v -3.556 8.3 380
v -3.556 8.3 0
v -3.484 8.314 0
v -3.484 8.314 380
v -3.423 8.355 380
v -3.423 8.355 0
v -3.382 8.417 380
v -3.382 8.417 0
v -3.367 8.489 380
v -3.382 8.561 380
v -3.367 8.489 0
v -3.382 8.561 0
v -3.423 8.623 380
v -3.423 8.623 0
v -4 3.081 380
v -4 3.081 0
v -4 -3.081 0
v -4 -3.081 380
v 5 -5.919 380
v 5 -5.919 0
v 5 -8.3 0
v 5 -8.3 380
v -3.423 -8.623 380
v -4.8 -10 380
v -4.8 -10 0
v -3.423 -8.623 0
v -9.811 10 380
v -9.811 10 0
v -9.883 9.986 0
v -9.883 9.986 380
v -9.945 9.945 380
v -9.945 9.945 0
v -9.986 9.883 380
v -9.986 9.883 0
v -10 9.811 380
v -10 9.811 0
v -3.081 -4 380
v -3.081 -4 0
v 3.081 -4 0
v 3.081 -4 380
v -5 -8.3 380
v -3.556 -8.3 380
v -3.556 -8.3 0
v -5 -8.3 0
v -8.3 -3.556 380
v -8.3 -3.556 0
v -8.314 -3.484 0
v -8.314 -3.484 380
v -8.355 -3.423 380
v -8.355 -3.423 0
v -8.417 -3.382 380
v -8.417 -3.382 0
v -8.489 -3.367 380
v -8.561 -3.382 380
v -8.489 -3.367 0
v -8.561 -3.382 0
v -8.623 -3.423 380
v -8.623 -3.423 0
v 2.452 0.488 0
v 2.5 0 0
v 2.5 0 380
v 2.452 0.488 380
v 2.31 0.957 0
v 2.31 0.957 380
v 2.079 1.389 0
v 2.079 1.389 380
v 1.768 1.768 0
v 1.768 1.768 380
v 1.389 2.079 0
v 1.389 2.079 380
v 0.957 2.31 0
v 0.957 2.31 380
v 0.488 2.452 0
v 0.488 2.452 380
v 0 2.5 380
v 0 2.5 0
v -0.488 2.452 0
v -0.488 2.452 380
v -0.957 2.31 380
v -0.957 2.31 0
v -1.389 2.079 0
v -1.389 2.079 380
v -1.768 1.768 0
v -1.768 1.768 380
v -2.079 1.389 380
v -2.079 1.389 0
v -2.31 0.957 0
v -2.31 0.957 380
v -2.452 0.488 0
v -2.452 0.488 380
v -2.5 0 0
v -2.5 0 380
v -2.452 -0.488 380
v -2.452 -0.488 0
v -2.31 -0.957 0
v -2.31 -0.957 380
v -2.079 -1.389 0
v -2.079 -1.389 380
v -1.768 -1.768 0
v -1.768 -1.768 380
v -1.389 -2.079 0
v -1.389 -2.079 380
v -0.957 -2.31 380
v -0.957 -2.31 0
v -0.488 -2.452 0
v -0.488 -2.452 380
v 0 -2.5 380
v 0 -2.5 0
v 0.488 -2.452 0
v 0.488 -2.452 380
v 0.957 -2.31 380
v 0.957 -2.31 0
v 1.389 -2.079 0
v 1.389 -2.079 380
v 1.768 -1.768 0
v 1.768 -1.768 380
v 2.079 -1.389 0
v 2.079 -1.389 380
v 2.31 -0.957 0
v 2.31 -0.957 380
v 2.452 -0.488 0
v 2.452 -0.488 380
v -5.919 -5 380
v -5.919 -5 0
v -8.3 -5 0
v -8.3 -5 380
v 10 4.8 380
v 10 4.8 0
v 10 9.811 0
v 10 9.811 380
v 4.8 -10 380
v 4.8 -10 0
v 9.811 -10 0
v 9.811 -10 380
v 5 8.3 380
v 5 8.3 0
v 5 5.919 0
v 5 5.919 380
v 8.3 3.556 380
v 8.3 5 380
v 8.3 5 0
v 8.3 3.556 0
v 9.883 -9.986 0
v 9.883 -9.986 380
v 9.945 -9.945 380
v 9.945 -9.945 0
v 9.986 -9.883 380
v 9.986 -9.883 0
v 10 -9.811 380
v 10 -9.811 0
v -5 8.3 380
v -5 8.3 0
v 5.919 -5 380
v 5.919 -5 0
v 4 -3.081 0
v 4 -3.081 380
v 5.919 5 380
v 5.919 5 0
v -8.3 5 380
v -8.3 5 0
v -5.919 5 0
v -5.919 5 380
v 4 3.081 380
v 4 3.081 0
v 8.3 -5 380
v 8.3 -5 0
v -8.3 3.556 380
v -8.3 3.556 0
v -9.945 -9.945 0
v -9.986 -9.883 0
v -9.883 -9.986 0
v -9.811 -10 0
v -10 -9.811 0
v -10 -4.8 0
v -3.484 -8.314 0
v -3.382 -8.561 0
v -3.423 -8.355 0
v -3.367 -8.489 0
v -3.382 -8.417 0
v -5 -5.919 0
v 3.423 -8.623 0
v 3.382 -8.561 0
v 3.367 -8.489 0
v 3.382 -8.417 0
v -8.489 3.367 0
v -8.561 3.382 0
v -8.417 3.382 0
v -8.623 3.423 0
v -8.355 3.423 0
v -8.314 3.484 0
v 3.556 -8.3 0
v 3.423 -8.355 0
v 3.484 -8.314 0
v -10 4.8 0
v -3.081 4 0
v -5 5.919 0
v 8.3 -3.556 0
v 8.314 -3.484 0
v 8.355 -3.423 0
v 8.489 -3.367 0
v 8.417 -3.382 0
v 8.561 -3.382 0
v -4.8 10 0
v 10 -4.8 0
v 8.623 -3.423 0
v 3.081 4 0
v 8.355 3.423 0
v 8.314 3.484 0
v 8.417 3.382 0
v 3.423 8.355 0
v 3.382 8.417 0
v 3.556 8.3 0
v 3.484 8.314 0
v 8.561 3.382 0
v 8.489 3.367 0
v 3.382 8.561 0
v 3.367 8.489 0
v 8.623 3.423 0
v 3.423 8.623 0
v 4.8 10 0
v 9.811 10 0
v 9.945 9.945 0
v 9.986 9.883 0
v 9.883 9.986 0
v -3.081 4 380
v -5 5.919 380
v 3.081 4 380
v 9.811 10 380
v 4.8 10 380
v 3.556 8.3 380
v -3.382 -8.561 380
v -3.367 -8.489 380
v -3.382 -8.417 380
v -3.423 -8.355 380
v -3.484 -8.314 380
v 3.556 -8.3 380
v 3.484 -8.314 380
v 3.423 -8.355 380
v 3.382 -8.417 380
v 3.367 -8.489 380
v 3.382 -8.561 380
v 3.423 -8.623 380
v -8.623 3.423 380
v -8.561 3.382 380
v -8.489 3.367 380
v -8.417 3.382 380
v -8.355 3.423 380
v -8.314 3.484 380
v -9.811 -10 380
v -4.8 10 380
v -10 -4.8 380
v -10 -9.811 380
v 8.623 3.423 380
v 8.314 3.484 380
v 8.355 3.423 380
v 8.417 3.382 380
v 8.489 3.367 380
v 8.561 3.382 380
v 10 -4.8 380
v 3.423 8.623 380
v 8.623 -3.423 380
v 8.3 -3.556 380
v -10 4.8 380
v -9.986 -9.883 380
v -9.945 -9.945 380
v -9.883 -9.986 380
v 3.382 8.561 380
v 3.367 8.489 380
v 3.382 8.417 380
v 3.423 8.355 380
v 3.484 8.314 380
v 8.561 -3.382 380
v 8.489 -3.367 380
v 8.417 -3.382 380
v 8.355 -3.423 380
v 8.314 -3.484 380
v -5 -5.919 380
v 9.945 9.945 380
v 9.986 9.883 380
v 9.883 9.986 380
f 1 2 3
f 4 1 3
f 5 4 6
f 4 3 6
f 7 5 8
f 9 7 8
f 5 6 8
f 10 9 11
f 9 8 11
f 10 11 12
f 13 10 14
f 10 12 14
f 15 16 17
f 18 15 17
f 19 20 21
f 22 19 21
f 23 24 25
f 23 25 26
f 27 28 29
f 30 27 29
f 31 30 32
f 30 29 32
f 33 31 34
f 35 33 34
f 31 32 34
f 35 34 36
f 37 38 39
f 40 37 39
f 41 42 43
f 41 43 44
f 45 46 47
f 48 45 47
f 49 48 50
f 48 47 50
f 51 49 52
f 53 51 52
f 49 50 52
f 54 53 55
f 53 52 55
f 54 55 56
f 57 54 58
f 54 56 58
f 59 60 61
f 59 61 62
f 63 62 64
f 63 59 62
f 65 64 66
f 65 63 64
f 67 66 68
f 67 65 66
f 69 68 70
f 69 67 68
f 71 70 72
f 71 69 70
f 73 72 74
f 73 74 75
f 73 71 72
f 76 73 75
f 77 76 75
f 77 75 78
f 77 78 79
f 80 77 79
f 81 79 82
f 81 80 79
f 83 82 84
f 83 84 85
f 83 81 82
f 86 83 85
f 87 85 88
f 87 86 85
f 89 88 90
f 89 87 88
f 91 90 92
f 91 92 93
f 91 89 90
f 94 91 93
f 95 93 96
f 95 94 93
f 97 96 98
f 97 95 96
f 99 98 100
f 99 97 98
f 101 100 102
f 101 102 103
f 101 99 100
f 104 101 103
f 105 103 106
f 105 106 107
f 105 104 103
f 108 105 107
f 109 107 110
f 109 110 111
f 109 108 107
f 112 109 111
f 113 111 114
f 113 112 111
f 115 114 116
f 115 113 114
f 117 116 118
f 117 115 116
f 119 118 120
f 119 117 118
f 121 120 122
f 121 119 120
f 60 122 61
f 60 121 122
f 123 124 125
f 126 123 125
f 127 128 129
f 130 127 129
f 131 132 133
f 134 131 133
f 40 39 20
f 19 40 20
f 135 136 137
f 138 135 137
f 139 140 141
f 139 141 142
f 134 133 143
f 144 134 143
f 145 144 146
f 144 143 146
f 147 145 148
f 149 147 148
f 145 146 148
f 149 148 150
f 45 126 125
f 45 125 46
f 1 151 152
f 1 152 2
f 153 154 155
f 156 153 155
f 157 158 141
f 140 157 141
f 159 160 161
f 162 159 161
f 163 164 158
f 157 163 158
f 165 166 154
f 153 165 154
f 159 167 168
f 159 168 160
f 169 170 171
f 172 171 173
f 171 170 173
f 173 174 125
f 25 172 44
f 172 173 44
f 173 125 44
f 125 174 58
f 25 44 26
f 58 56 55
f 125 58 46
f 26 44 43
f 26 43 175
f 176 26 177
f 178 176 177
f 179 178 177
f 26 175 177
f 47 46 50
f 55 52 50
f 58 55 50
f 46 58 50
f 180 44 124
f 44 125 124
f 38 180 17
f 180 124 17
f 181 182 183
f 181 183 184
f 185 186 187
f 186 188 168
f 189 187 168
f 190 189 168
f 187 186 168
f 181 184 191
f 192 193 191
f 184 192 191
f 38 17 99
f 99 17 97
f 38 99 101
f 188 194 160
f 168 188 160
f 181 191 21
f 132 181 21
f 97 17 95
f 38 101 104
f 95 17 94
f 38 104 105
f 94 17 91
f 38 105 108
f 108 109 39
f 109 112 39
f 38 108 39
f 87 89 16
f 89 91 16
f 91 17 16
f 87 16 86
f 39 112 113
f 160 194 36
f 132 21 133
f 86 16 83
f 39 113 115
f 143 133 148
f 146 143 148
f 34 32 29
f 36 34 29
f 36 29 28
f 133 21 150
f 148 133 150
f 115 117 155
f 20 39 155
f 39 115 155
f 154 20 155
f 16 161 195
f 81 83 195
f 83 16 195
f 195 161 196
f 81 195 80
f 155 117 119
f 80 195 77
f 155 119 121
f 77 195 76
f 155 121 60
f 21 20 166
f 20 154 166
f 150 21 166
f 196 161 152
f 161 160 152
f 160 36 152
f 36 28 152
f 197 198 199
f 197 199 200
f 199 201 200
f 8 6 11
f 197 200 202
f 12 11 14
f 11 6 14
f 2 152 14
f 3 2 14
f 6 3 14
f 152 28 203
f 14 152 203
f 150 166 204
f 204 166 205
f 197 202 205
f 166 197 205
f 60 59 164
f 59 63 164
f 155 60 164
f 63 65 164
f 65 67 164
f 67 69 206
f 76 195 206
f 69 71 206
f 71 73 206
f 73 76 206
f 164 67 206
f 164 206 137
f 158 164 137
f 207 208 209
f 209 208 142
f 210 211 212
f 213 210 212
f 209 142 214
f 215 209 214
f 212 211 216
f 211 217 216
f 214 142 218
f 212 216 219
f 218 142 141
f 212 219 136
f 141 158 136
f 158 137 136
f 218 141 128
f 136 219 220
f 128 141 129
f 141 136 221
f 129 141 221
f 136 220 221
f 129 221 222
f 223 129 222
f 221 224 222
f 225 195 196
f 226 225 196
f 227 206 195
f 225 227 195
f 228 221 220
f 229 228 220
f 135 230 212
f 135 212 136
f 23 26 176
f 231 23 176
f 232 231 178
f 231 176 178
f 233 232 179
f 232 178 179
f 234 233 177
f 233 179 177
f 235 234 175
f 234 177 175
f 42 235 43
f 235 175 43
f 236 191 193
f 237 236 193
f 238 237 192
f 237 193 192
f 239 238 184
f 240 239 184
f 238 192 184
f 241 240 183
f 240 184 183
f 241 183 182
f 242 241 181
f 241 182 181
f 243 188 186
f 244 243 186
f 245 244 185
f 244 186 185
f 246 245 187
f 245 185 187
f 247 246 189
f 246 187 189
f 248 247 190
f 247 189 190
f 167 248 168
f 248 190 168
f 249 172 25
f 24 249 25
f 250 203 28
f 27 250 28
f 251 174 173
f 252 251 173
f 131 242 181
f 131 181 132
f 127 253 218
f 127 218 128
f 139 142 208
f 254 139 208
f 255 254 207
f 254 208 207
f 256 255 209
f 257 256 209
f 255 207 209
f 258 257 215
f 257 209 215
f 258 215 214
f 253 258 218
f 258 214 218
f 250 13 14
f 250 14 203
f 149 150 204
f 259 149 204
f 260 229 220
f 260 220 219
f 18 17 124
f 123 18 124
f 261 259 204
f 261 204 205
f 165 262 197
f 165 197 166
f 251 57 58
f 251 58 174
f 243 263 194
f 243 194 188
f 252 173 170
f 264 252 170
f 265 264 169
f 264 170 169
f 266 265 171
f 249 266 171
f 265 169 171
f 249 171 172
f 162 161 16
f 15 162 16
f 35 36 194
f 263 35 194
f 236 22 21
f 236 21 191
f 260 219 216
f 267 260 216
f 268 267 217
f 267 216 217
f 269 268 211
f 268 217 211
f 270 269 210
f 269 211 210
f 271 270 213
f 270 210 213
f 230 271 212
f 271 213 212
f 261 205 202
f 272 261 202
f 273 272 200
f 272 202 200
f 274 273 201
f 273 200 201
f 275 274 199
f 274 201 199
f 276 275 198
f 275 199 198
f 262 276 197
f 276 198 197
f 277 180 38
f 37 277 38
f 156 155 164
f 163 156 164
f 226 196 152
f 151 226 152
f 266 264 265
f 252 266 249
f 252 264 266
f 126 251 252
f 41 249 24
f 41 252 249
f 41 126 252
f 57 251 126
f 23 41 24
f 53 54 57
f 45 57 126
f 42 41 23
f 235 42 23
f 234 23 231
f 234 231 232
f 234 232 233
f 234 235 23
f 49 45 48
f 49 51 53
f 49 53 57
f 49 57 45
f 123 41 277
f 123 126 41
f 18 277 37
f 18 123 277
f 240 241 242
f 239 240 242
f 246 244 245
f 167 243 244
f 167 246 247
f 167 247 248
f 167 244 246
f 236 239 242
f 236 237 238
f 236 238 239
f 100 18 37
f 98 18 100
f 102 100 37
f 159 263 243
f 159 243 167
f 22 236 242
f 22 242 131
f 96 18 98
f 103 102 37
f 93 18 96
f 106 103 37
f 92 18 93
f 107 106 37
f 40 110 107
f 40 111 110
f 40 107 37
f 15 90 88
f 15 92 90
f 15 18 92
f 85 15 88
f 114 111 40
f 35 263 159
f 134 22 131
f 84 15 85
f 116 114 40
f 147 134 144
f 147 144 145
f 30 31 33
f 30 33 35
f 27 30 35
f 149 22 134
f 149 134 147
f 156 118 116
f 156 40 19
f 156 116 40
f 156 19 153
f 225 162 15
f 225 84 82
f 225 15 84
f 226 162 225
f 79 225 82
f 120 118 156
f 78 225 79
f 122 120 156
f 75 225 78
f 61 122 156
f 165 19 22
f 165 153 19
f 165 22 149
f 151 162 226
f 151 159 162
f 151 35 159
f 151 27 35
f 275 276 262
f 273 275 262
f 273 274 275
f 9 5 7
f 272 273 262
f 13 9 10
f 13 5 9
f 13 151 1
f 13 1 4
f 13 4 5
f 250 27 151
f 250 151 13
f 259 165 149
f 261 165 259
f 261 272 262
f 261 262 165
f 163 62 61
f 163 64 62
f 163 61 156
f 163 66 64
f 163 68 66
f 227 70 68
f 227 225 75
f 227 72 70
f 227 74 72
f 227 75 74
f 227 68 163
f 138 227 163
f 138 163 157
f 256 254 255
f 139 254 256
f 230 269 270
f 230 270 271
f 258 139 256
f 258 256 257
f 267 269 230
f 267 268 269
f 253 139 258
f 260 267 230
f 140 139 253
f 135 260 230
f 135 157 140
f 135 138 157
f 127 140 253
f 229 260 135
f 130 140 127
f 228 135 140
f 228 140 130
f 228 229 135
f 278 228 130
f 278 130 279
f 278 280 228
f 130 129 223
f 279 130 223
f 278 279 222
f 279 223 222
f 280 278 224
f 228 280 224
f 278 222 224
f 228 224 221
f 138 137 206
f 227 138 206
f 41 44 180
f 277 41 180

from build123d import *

# Parameters (mm, degrees)
SKETCH1_R           = 2.5
BOSS_EXTRUDE4_DEPTH = 380


with BuildPart() as part:
    # Sketch1 → Boss-Extrude4 (new body)
    with BuildSketch(Plane.XY):
        with BuildLine():
            Line((-10, 9.810918806), (-10, 4.8))
            Line((-10, 4.8), (-8.622781789, 3.422781789))
            ThreePointArc((-8.622781789, 3.422781789), (-8.416722954, 3.381794139), (-8.3, 3.556482384))
            Line((-8.3, 3.556482384), (-8.3, 5))
            Line((-8.3, 5), (-5.919238816, 5))
            Line((-5.919238816, 5), (-4, 3.080761184))
            Line((-4, 3.080761184), (-4, -3.080761184))
            Line((-4, -3.080761184), (-5.919238816, -5))
            Line((-5.919238816, -5), (-8.3, -5))
            Line((-8.3, -5), (-8.3, -3.556482384))
            ThreePointArc((-8.3, -3.556482384), (-8.416722954, -3.381794139), (-8.622781789, -3.422781789))
            Line((-8.622781789, -3.422781789), (-10, -4.8))
            Line((-10, -4.8), (-10, -9.810918806))
            ThreePointArc((-10, -9.810918806), (-9.9446194, -9.9446194), (-9.810918806, -10))
            Line((-9.810918806, -10), (-4.8, -10))
            Line((-4.8, -10), (-3.422781789, -8.622781789))
            ThreePointArc((-3.422781789, -8.622781789), (-3.381794139, -8.416722954), (-3.556482384, -8.3))
            Line((-3.556482384, -8.3), (-5, -8.3))
            Line((-5, -8.3), (-5, -5.919238816))
            Line((-5, -5.919238816), (-3.080761184, -4))
            Line((-3.080761184, -4), (0, -4))
            Line((0, -4), (3.080761184, -4))
            Line((3.080761184, -4), (5, -5.919238816))
            Line((5, -5.919238816), (5, -8.3))
            Line((5, -8.3), (3.556482384, -8.3))
            ThreePointArc((3.556482384, -8.3), (3.381794139, -8.416722954), (3.422781789, -8.622781789))
            Line((3.422781789, -8.622781789), (4.8, -10))
            Line((4.8, -10), (9.810918806, -10))
            ThreePointArc((9.810918806, -10), (9.9446194, -9.9446194), (10, -9.810918806))
            Line((10, -9.810918806), (10, -4.8))
            Line((10, -4.8), (8.622781789, -3.422781789))
            ThreePointArc((8.622781789, -3.422781789), (8.416722954, -3.381794139), (8.3, -3.556482384))
            Line((8.3, -3.556482384), (8.3, -5))
            Line((8.3, -5), (5.919238816, -5))
            Line((5.919238816, -5), (4, -3.080761184))
            Line((4, -3.080761184), (4, 3.080761184))
            Line((4, 3.080761184), (5.919238816, 5))
            Line((5.919238816, 5), (8.3, 5))
            Line((8.3, 5), (8.3, 3.556482384))
            ThreePointArc((8.3, 3.556482384), (8.416722954, 3.381794139), (8.622781789, 3.422781789))
            Line((8.622781789, 3.422781789), (10, 4.8))
            Line((10, 4.8), (10, 9.810918806))
            ThreePointArc((10, 9.810918806), (9.9446194, 9.9446194), (9.810918806, 10))
            Line((9.810918806, 10), (4.8, 10))
            Line((4.8, 10), (3.422781789, 8.622781789))
            ThreePointArc((3.422781789, 8.622781789), (3.381794139, 8.416722954), (3.556482384, 8.3))
            Line((3.556482384, 8.3), (5, 8.3))
            Line((5, 8.3), (5, 5.919238816))
            Line((5, 5.919238816), (3.080761184, 4))
            Line((3.080761184, 4), (-3.080761184, 4))
            Line((-3.080761184, 4), (-5, 5.919238816))
            Line((-5, 5.919238816), (-5, 8.3))
            Line((-5, 8.3), (-3.556482384, 8.3))
            ThreePointArc((-3.556482384, 8.3), (-3.381794139, 8.416722954), (-3.422781789, 8.622781789))
            Line((-3.422781789, 8.622781789), (-4.8, 10))
            Line((-4.8, 10), (-9.810918806, 10))
            ThreePointArc((-9.810918806, 10), (-9.9446194, 9.9446194), (-10, 9.810918806))
        make_face()
        Circle(SKETCH1_R, mode=Mode.SUBTRACT)
    extrude(amount=BOSS_EXTRUDE4_DEPTH)


solid = part.part
